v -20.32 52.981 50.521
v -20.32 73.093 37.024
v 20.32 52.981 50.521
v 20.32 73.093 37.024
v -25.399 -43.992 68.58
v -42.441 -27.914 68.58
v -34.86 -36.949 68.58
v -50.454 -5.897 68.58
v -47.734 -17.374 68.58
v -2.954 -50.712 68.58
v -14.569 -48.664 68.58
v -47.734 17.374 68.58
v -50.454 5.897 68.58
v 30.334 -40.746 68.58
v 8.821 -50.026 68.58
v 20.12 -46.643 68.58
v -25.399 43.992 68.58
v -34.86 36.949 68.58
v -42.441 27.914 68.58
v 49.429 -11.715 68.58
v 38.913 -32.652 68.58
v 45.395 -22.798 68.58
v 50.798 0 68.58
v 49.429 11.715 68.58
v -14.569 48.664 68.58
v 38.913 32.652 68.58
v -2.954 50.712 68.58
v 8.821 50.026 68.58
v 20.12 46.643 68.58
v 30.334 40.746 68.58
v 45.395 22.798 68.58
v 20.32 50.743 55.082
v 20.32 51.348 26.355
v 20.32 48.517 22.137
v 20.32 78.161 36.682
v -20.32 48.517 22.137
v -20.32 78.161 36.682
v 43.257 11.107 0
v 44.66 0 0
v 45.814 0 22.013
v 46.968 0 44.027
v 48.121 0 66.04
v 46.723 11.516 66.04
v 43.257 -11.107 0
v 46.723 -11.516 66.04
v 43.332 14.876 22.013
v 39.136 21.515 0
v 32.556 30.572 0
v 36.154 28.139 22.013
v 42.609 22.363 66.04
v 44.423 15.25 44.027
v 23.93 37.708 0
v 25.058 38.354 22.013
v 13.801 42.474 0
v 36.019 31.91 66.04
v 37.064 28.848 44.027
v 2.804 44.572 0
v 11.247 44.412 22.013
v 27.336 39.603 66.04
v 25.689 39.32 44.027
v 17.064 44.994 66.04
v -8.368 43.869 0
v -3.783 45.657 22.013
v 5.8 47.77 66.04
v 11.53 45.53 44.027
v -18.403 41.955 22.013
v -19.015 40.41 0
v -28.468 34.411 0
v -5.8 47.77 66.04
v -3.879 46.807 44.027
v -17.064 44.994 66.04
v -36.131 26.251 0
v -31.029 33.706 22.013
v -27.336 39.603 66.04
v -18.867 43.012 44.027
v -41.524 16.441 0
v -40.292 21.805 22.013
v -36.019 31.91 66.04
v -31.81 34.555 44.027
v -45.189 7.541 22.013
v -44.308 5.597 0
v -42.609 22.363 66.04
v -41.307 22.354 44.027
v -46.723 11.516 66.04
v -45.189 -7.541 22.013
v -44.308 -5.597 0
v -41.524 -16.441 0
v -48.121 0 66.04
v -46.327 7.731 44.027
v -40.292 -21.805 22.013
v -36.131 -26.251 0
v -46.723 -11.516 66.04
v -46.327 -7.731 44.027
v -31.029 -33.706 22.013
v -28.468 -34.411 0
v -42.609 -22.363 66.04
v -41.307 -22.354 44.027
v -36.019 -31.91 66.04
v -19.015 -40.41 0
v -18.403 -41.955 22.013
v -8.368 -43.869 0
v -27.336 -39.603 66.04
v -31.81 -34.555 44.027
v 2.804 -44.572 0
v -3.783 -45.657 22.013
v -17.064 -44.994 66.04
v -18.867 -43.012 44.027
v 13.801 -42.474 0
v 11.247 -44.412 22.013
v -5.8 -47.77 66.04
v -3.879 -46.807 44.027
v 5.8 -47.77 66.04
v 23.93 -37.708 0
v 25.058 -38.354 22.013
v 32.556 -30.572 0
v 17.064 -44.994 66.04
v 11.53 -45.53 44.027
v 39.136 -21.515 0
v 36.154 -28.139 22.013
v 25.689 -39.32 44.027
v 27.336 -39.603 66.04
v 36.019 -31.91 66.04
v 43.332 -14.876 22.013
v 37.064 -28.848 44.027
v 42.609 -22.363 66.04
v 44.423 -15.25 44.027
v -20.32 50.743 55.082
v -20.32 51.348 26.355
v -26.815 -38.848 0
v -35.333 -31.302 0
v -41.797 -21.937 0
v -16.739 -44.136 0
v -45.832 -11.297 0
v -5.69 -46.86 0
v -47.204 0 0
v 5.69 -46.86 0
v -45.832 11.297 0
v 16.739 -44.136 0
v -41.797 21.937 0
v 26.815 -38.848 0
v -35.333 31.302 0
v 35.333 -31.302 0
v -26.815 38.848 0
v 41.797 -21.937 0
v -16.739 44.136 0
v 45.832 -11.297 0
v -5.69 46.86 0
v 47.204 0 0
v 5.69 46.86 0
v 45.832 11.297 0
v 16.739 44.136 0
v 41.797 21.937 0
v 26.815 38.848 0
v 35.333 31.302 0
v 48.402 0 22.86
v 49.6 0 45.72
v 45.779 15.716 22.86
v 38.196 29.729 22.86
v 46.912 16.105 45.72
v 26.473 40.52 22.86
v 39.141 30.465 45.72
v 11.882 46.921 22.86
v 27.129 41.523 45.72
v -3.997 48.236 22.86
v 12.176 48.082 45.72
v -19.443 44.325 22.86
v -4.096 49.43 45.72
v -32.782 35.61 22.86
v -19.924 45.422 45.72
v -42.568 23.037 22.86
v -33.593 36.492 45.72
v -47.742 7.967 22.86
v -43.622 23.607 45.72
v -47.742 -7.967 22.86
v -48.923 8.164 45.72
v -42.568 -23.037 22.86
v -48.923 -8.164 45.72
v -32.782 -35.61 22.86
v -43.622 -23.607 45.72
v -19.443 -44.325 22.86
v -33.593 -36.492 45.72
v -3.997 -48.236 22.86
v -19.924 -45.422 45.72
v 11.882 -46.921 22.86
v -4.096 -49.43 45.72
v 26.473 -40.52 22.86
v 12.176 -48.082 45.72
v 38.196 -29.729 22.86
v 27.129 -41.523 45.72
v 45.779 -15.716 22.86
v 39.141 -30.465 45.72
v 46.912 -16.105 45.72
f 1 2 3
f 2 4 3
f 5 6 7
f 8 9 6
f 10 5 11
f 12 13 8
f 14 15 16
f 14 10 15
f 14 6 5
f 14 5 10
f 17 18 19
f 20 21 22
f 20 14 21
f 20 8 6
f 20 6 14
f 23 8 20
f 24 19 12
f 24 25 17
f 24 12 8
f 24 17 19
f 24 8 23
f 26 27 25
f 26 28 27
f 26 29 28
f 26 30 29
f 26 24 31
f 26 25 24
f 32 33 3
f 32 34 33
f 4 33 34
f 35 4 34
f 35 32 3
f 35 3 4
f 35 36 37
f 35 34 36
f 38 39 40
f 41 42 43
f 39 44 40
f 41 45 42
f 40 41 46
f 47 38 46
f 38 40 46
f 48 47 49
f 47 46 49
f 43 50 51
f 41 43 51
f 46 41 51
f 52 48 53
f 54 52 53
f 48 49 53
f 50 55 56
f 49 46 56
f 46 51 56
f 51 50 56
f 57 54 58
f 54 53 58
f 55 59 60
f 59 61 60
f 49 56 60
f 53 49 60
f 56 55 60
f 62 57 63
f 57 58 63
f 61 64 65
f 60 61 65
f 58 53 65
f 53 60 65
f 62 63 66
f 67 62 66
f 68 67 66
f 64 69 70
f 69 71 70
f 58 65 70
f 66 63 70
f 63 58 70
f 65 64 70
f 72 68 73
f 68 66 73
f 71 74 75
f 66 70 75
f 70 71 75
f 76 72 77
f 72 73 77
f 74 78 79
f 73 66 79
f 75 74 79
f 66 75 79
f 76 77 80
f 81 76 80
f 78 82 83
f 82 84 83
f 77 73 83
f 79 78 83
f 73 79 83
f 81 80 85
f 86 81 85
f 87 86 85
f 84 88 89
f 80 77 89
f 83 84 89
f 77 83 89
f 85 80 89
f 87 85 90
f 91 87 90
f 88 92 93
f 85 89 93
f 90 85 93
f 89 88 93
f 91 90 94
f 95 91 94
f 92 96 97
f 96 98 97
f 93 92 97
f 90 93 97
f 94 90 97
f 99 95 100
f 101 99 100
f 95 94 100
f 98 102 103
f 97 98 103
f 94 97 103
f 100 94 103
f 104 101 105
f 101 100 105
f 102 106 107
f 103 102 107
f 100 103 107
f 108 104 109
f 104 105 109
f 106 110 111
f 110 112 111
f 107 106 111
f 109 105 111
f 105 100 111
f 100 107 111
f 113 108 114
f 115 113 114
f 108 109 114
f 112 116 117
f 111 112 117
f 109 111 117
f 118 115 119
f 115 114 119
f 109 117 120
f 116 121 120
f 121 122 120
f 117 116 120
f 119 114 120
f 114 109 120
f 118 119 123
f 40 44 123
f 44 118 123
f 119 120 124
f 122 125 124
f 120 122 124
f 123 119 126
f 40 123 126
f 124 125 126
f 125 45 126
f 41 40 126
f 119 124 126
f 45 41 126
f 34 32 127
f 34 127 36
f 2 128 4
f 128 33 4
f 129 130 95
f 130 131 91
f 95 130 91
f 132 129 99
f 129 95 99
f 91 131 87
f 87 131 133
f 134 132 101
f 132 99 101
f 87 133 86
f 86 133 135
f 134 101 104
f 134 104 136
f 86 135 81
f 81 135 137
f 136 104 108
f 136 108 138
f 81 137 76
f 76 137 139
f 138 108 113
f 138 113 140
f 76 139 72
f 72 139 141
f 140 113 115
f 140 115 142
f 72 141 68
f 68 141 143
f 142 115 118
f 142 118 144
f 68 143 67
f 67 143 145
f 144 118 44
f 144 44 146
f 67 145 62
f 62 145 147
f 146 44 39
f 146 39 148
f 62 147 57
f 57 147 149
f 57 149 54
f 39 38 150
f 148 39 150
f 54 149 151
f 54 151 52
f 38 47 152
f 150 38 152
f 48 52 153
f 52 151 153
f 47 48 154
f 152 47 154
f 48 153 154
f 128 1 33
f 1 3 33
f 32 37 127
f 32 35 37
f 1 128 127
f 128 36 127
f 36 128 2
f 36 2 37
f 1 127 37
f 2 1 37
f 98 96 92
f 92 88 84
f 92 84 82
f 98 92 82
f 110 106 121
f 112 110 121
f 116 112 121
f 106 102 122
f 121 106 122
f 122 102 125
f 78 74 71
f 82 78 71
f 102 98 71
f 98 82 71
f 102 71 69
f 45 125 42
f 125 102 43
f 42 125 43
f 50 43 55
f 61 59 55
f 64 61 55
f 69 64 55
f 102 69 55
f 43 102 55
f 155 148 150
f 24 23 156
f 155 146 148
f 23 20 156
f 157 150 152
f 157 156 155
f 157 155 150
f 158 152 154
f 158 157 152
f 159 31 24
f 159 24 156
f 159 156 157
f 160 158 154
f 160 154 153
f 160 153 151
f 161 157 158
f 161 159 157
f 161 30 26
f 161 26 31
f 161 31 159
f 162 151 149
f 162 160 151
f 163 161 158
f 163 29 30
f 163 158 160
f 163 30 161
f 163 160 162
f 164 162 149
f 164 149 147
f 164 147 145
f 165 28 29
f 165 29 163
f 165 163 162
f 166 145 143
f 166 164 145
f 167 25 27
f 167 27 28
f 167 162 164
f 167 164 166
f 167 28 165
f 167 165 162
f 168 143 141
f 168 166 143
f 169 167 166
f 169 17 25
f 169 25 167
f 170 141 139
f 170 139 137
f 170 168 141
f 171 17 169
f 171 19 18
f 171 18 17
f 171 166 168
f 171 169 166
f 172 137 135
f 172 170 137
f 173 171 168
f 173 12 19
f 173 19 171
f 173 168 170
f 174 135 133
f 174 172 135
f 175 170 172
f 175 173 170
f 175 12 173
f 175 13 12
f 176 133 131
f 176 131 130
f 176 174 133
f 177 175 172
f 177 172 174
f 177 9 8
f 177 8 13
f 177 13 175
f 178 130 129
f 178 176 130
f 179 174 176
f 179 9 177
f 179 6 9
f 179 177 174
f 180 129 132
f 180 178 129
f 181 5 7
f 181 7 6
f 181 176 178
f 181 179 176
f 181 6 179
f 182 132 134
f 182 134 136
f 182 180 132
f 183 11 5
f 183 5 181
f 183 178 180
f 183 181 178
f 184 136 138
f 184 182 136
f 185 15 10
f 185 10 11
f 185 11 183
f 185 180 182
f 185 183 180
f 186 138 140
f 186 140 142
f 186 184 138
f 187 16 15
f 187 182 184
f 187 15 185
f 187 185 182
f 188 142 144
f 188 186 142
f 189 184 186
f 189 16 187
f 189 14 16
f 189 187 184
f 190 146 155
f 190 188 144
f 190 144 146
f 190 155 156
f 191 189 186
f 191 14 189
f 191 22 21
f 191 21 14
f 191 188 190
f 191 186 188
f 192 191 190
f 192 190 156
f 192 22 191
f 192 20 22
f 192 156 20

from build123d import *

# Parameters (mm, degrees)
F0_R     = 47.2037457073
F1_DEPTH = 68.58
F1_TAPER = -3
F3_DEPTH = 20.32
F4_T     = -2.54
F5_T     = -2.54


with BuildPart() as f1:
    # F0 (on Top) → F1 (new body)
    with BuildSketch(Plane.XY):
        Circle(F0_R)
    extrude(amount=F1_DEPTH, taper=F1_TAPER)

    # F5
    f5_openings = [f1.faces().sort_by_distance(p)[0] for p in [
        (0, 0, 0),
    ]]
    offset(amount=F5_T, openings=f5_openings, kind=Kind.INTERSECTION)


with BuildPart() as f3:
    # F2 (on Right) → F3 (new body, symmetric)
    with BuildSketch(Plane.YZ):
        Polygon((78.1612671151, 36.6816926789), (50.7431694437, 55.0819187667), (48.5171550519, 22.137036616), align=None)
    extrude(amount=F3_DEPTH, both=True)

    # F4
    f4_openings = [f3.faces().sort_by_distance(p)[0] for p in [
        (-20.32, 59.140531, 37.966883),
        (20.32, 59.140531, 37.966883),
    ]]
    offset(amount=F4_T, openings=f4_openings)


solid = Compound([f1.part, f3.part])
